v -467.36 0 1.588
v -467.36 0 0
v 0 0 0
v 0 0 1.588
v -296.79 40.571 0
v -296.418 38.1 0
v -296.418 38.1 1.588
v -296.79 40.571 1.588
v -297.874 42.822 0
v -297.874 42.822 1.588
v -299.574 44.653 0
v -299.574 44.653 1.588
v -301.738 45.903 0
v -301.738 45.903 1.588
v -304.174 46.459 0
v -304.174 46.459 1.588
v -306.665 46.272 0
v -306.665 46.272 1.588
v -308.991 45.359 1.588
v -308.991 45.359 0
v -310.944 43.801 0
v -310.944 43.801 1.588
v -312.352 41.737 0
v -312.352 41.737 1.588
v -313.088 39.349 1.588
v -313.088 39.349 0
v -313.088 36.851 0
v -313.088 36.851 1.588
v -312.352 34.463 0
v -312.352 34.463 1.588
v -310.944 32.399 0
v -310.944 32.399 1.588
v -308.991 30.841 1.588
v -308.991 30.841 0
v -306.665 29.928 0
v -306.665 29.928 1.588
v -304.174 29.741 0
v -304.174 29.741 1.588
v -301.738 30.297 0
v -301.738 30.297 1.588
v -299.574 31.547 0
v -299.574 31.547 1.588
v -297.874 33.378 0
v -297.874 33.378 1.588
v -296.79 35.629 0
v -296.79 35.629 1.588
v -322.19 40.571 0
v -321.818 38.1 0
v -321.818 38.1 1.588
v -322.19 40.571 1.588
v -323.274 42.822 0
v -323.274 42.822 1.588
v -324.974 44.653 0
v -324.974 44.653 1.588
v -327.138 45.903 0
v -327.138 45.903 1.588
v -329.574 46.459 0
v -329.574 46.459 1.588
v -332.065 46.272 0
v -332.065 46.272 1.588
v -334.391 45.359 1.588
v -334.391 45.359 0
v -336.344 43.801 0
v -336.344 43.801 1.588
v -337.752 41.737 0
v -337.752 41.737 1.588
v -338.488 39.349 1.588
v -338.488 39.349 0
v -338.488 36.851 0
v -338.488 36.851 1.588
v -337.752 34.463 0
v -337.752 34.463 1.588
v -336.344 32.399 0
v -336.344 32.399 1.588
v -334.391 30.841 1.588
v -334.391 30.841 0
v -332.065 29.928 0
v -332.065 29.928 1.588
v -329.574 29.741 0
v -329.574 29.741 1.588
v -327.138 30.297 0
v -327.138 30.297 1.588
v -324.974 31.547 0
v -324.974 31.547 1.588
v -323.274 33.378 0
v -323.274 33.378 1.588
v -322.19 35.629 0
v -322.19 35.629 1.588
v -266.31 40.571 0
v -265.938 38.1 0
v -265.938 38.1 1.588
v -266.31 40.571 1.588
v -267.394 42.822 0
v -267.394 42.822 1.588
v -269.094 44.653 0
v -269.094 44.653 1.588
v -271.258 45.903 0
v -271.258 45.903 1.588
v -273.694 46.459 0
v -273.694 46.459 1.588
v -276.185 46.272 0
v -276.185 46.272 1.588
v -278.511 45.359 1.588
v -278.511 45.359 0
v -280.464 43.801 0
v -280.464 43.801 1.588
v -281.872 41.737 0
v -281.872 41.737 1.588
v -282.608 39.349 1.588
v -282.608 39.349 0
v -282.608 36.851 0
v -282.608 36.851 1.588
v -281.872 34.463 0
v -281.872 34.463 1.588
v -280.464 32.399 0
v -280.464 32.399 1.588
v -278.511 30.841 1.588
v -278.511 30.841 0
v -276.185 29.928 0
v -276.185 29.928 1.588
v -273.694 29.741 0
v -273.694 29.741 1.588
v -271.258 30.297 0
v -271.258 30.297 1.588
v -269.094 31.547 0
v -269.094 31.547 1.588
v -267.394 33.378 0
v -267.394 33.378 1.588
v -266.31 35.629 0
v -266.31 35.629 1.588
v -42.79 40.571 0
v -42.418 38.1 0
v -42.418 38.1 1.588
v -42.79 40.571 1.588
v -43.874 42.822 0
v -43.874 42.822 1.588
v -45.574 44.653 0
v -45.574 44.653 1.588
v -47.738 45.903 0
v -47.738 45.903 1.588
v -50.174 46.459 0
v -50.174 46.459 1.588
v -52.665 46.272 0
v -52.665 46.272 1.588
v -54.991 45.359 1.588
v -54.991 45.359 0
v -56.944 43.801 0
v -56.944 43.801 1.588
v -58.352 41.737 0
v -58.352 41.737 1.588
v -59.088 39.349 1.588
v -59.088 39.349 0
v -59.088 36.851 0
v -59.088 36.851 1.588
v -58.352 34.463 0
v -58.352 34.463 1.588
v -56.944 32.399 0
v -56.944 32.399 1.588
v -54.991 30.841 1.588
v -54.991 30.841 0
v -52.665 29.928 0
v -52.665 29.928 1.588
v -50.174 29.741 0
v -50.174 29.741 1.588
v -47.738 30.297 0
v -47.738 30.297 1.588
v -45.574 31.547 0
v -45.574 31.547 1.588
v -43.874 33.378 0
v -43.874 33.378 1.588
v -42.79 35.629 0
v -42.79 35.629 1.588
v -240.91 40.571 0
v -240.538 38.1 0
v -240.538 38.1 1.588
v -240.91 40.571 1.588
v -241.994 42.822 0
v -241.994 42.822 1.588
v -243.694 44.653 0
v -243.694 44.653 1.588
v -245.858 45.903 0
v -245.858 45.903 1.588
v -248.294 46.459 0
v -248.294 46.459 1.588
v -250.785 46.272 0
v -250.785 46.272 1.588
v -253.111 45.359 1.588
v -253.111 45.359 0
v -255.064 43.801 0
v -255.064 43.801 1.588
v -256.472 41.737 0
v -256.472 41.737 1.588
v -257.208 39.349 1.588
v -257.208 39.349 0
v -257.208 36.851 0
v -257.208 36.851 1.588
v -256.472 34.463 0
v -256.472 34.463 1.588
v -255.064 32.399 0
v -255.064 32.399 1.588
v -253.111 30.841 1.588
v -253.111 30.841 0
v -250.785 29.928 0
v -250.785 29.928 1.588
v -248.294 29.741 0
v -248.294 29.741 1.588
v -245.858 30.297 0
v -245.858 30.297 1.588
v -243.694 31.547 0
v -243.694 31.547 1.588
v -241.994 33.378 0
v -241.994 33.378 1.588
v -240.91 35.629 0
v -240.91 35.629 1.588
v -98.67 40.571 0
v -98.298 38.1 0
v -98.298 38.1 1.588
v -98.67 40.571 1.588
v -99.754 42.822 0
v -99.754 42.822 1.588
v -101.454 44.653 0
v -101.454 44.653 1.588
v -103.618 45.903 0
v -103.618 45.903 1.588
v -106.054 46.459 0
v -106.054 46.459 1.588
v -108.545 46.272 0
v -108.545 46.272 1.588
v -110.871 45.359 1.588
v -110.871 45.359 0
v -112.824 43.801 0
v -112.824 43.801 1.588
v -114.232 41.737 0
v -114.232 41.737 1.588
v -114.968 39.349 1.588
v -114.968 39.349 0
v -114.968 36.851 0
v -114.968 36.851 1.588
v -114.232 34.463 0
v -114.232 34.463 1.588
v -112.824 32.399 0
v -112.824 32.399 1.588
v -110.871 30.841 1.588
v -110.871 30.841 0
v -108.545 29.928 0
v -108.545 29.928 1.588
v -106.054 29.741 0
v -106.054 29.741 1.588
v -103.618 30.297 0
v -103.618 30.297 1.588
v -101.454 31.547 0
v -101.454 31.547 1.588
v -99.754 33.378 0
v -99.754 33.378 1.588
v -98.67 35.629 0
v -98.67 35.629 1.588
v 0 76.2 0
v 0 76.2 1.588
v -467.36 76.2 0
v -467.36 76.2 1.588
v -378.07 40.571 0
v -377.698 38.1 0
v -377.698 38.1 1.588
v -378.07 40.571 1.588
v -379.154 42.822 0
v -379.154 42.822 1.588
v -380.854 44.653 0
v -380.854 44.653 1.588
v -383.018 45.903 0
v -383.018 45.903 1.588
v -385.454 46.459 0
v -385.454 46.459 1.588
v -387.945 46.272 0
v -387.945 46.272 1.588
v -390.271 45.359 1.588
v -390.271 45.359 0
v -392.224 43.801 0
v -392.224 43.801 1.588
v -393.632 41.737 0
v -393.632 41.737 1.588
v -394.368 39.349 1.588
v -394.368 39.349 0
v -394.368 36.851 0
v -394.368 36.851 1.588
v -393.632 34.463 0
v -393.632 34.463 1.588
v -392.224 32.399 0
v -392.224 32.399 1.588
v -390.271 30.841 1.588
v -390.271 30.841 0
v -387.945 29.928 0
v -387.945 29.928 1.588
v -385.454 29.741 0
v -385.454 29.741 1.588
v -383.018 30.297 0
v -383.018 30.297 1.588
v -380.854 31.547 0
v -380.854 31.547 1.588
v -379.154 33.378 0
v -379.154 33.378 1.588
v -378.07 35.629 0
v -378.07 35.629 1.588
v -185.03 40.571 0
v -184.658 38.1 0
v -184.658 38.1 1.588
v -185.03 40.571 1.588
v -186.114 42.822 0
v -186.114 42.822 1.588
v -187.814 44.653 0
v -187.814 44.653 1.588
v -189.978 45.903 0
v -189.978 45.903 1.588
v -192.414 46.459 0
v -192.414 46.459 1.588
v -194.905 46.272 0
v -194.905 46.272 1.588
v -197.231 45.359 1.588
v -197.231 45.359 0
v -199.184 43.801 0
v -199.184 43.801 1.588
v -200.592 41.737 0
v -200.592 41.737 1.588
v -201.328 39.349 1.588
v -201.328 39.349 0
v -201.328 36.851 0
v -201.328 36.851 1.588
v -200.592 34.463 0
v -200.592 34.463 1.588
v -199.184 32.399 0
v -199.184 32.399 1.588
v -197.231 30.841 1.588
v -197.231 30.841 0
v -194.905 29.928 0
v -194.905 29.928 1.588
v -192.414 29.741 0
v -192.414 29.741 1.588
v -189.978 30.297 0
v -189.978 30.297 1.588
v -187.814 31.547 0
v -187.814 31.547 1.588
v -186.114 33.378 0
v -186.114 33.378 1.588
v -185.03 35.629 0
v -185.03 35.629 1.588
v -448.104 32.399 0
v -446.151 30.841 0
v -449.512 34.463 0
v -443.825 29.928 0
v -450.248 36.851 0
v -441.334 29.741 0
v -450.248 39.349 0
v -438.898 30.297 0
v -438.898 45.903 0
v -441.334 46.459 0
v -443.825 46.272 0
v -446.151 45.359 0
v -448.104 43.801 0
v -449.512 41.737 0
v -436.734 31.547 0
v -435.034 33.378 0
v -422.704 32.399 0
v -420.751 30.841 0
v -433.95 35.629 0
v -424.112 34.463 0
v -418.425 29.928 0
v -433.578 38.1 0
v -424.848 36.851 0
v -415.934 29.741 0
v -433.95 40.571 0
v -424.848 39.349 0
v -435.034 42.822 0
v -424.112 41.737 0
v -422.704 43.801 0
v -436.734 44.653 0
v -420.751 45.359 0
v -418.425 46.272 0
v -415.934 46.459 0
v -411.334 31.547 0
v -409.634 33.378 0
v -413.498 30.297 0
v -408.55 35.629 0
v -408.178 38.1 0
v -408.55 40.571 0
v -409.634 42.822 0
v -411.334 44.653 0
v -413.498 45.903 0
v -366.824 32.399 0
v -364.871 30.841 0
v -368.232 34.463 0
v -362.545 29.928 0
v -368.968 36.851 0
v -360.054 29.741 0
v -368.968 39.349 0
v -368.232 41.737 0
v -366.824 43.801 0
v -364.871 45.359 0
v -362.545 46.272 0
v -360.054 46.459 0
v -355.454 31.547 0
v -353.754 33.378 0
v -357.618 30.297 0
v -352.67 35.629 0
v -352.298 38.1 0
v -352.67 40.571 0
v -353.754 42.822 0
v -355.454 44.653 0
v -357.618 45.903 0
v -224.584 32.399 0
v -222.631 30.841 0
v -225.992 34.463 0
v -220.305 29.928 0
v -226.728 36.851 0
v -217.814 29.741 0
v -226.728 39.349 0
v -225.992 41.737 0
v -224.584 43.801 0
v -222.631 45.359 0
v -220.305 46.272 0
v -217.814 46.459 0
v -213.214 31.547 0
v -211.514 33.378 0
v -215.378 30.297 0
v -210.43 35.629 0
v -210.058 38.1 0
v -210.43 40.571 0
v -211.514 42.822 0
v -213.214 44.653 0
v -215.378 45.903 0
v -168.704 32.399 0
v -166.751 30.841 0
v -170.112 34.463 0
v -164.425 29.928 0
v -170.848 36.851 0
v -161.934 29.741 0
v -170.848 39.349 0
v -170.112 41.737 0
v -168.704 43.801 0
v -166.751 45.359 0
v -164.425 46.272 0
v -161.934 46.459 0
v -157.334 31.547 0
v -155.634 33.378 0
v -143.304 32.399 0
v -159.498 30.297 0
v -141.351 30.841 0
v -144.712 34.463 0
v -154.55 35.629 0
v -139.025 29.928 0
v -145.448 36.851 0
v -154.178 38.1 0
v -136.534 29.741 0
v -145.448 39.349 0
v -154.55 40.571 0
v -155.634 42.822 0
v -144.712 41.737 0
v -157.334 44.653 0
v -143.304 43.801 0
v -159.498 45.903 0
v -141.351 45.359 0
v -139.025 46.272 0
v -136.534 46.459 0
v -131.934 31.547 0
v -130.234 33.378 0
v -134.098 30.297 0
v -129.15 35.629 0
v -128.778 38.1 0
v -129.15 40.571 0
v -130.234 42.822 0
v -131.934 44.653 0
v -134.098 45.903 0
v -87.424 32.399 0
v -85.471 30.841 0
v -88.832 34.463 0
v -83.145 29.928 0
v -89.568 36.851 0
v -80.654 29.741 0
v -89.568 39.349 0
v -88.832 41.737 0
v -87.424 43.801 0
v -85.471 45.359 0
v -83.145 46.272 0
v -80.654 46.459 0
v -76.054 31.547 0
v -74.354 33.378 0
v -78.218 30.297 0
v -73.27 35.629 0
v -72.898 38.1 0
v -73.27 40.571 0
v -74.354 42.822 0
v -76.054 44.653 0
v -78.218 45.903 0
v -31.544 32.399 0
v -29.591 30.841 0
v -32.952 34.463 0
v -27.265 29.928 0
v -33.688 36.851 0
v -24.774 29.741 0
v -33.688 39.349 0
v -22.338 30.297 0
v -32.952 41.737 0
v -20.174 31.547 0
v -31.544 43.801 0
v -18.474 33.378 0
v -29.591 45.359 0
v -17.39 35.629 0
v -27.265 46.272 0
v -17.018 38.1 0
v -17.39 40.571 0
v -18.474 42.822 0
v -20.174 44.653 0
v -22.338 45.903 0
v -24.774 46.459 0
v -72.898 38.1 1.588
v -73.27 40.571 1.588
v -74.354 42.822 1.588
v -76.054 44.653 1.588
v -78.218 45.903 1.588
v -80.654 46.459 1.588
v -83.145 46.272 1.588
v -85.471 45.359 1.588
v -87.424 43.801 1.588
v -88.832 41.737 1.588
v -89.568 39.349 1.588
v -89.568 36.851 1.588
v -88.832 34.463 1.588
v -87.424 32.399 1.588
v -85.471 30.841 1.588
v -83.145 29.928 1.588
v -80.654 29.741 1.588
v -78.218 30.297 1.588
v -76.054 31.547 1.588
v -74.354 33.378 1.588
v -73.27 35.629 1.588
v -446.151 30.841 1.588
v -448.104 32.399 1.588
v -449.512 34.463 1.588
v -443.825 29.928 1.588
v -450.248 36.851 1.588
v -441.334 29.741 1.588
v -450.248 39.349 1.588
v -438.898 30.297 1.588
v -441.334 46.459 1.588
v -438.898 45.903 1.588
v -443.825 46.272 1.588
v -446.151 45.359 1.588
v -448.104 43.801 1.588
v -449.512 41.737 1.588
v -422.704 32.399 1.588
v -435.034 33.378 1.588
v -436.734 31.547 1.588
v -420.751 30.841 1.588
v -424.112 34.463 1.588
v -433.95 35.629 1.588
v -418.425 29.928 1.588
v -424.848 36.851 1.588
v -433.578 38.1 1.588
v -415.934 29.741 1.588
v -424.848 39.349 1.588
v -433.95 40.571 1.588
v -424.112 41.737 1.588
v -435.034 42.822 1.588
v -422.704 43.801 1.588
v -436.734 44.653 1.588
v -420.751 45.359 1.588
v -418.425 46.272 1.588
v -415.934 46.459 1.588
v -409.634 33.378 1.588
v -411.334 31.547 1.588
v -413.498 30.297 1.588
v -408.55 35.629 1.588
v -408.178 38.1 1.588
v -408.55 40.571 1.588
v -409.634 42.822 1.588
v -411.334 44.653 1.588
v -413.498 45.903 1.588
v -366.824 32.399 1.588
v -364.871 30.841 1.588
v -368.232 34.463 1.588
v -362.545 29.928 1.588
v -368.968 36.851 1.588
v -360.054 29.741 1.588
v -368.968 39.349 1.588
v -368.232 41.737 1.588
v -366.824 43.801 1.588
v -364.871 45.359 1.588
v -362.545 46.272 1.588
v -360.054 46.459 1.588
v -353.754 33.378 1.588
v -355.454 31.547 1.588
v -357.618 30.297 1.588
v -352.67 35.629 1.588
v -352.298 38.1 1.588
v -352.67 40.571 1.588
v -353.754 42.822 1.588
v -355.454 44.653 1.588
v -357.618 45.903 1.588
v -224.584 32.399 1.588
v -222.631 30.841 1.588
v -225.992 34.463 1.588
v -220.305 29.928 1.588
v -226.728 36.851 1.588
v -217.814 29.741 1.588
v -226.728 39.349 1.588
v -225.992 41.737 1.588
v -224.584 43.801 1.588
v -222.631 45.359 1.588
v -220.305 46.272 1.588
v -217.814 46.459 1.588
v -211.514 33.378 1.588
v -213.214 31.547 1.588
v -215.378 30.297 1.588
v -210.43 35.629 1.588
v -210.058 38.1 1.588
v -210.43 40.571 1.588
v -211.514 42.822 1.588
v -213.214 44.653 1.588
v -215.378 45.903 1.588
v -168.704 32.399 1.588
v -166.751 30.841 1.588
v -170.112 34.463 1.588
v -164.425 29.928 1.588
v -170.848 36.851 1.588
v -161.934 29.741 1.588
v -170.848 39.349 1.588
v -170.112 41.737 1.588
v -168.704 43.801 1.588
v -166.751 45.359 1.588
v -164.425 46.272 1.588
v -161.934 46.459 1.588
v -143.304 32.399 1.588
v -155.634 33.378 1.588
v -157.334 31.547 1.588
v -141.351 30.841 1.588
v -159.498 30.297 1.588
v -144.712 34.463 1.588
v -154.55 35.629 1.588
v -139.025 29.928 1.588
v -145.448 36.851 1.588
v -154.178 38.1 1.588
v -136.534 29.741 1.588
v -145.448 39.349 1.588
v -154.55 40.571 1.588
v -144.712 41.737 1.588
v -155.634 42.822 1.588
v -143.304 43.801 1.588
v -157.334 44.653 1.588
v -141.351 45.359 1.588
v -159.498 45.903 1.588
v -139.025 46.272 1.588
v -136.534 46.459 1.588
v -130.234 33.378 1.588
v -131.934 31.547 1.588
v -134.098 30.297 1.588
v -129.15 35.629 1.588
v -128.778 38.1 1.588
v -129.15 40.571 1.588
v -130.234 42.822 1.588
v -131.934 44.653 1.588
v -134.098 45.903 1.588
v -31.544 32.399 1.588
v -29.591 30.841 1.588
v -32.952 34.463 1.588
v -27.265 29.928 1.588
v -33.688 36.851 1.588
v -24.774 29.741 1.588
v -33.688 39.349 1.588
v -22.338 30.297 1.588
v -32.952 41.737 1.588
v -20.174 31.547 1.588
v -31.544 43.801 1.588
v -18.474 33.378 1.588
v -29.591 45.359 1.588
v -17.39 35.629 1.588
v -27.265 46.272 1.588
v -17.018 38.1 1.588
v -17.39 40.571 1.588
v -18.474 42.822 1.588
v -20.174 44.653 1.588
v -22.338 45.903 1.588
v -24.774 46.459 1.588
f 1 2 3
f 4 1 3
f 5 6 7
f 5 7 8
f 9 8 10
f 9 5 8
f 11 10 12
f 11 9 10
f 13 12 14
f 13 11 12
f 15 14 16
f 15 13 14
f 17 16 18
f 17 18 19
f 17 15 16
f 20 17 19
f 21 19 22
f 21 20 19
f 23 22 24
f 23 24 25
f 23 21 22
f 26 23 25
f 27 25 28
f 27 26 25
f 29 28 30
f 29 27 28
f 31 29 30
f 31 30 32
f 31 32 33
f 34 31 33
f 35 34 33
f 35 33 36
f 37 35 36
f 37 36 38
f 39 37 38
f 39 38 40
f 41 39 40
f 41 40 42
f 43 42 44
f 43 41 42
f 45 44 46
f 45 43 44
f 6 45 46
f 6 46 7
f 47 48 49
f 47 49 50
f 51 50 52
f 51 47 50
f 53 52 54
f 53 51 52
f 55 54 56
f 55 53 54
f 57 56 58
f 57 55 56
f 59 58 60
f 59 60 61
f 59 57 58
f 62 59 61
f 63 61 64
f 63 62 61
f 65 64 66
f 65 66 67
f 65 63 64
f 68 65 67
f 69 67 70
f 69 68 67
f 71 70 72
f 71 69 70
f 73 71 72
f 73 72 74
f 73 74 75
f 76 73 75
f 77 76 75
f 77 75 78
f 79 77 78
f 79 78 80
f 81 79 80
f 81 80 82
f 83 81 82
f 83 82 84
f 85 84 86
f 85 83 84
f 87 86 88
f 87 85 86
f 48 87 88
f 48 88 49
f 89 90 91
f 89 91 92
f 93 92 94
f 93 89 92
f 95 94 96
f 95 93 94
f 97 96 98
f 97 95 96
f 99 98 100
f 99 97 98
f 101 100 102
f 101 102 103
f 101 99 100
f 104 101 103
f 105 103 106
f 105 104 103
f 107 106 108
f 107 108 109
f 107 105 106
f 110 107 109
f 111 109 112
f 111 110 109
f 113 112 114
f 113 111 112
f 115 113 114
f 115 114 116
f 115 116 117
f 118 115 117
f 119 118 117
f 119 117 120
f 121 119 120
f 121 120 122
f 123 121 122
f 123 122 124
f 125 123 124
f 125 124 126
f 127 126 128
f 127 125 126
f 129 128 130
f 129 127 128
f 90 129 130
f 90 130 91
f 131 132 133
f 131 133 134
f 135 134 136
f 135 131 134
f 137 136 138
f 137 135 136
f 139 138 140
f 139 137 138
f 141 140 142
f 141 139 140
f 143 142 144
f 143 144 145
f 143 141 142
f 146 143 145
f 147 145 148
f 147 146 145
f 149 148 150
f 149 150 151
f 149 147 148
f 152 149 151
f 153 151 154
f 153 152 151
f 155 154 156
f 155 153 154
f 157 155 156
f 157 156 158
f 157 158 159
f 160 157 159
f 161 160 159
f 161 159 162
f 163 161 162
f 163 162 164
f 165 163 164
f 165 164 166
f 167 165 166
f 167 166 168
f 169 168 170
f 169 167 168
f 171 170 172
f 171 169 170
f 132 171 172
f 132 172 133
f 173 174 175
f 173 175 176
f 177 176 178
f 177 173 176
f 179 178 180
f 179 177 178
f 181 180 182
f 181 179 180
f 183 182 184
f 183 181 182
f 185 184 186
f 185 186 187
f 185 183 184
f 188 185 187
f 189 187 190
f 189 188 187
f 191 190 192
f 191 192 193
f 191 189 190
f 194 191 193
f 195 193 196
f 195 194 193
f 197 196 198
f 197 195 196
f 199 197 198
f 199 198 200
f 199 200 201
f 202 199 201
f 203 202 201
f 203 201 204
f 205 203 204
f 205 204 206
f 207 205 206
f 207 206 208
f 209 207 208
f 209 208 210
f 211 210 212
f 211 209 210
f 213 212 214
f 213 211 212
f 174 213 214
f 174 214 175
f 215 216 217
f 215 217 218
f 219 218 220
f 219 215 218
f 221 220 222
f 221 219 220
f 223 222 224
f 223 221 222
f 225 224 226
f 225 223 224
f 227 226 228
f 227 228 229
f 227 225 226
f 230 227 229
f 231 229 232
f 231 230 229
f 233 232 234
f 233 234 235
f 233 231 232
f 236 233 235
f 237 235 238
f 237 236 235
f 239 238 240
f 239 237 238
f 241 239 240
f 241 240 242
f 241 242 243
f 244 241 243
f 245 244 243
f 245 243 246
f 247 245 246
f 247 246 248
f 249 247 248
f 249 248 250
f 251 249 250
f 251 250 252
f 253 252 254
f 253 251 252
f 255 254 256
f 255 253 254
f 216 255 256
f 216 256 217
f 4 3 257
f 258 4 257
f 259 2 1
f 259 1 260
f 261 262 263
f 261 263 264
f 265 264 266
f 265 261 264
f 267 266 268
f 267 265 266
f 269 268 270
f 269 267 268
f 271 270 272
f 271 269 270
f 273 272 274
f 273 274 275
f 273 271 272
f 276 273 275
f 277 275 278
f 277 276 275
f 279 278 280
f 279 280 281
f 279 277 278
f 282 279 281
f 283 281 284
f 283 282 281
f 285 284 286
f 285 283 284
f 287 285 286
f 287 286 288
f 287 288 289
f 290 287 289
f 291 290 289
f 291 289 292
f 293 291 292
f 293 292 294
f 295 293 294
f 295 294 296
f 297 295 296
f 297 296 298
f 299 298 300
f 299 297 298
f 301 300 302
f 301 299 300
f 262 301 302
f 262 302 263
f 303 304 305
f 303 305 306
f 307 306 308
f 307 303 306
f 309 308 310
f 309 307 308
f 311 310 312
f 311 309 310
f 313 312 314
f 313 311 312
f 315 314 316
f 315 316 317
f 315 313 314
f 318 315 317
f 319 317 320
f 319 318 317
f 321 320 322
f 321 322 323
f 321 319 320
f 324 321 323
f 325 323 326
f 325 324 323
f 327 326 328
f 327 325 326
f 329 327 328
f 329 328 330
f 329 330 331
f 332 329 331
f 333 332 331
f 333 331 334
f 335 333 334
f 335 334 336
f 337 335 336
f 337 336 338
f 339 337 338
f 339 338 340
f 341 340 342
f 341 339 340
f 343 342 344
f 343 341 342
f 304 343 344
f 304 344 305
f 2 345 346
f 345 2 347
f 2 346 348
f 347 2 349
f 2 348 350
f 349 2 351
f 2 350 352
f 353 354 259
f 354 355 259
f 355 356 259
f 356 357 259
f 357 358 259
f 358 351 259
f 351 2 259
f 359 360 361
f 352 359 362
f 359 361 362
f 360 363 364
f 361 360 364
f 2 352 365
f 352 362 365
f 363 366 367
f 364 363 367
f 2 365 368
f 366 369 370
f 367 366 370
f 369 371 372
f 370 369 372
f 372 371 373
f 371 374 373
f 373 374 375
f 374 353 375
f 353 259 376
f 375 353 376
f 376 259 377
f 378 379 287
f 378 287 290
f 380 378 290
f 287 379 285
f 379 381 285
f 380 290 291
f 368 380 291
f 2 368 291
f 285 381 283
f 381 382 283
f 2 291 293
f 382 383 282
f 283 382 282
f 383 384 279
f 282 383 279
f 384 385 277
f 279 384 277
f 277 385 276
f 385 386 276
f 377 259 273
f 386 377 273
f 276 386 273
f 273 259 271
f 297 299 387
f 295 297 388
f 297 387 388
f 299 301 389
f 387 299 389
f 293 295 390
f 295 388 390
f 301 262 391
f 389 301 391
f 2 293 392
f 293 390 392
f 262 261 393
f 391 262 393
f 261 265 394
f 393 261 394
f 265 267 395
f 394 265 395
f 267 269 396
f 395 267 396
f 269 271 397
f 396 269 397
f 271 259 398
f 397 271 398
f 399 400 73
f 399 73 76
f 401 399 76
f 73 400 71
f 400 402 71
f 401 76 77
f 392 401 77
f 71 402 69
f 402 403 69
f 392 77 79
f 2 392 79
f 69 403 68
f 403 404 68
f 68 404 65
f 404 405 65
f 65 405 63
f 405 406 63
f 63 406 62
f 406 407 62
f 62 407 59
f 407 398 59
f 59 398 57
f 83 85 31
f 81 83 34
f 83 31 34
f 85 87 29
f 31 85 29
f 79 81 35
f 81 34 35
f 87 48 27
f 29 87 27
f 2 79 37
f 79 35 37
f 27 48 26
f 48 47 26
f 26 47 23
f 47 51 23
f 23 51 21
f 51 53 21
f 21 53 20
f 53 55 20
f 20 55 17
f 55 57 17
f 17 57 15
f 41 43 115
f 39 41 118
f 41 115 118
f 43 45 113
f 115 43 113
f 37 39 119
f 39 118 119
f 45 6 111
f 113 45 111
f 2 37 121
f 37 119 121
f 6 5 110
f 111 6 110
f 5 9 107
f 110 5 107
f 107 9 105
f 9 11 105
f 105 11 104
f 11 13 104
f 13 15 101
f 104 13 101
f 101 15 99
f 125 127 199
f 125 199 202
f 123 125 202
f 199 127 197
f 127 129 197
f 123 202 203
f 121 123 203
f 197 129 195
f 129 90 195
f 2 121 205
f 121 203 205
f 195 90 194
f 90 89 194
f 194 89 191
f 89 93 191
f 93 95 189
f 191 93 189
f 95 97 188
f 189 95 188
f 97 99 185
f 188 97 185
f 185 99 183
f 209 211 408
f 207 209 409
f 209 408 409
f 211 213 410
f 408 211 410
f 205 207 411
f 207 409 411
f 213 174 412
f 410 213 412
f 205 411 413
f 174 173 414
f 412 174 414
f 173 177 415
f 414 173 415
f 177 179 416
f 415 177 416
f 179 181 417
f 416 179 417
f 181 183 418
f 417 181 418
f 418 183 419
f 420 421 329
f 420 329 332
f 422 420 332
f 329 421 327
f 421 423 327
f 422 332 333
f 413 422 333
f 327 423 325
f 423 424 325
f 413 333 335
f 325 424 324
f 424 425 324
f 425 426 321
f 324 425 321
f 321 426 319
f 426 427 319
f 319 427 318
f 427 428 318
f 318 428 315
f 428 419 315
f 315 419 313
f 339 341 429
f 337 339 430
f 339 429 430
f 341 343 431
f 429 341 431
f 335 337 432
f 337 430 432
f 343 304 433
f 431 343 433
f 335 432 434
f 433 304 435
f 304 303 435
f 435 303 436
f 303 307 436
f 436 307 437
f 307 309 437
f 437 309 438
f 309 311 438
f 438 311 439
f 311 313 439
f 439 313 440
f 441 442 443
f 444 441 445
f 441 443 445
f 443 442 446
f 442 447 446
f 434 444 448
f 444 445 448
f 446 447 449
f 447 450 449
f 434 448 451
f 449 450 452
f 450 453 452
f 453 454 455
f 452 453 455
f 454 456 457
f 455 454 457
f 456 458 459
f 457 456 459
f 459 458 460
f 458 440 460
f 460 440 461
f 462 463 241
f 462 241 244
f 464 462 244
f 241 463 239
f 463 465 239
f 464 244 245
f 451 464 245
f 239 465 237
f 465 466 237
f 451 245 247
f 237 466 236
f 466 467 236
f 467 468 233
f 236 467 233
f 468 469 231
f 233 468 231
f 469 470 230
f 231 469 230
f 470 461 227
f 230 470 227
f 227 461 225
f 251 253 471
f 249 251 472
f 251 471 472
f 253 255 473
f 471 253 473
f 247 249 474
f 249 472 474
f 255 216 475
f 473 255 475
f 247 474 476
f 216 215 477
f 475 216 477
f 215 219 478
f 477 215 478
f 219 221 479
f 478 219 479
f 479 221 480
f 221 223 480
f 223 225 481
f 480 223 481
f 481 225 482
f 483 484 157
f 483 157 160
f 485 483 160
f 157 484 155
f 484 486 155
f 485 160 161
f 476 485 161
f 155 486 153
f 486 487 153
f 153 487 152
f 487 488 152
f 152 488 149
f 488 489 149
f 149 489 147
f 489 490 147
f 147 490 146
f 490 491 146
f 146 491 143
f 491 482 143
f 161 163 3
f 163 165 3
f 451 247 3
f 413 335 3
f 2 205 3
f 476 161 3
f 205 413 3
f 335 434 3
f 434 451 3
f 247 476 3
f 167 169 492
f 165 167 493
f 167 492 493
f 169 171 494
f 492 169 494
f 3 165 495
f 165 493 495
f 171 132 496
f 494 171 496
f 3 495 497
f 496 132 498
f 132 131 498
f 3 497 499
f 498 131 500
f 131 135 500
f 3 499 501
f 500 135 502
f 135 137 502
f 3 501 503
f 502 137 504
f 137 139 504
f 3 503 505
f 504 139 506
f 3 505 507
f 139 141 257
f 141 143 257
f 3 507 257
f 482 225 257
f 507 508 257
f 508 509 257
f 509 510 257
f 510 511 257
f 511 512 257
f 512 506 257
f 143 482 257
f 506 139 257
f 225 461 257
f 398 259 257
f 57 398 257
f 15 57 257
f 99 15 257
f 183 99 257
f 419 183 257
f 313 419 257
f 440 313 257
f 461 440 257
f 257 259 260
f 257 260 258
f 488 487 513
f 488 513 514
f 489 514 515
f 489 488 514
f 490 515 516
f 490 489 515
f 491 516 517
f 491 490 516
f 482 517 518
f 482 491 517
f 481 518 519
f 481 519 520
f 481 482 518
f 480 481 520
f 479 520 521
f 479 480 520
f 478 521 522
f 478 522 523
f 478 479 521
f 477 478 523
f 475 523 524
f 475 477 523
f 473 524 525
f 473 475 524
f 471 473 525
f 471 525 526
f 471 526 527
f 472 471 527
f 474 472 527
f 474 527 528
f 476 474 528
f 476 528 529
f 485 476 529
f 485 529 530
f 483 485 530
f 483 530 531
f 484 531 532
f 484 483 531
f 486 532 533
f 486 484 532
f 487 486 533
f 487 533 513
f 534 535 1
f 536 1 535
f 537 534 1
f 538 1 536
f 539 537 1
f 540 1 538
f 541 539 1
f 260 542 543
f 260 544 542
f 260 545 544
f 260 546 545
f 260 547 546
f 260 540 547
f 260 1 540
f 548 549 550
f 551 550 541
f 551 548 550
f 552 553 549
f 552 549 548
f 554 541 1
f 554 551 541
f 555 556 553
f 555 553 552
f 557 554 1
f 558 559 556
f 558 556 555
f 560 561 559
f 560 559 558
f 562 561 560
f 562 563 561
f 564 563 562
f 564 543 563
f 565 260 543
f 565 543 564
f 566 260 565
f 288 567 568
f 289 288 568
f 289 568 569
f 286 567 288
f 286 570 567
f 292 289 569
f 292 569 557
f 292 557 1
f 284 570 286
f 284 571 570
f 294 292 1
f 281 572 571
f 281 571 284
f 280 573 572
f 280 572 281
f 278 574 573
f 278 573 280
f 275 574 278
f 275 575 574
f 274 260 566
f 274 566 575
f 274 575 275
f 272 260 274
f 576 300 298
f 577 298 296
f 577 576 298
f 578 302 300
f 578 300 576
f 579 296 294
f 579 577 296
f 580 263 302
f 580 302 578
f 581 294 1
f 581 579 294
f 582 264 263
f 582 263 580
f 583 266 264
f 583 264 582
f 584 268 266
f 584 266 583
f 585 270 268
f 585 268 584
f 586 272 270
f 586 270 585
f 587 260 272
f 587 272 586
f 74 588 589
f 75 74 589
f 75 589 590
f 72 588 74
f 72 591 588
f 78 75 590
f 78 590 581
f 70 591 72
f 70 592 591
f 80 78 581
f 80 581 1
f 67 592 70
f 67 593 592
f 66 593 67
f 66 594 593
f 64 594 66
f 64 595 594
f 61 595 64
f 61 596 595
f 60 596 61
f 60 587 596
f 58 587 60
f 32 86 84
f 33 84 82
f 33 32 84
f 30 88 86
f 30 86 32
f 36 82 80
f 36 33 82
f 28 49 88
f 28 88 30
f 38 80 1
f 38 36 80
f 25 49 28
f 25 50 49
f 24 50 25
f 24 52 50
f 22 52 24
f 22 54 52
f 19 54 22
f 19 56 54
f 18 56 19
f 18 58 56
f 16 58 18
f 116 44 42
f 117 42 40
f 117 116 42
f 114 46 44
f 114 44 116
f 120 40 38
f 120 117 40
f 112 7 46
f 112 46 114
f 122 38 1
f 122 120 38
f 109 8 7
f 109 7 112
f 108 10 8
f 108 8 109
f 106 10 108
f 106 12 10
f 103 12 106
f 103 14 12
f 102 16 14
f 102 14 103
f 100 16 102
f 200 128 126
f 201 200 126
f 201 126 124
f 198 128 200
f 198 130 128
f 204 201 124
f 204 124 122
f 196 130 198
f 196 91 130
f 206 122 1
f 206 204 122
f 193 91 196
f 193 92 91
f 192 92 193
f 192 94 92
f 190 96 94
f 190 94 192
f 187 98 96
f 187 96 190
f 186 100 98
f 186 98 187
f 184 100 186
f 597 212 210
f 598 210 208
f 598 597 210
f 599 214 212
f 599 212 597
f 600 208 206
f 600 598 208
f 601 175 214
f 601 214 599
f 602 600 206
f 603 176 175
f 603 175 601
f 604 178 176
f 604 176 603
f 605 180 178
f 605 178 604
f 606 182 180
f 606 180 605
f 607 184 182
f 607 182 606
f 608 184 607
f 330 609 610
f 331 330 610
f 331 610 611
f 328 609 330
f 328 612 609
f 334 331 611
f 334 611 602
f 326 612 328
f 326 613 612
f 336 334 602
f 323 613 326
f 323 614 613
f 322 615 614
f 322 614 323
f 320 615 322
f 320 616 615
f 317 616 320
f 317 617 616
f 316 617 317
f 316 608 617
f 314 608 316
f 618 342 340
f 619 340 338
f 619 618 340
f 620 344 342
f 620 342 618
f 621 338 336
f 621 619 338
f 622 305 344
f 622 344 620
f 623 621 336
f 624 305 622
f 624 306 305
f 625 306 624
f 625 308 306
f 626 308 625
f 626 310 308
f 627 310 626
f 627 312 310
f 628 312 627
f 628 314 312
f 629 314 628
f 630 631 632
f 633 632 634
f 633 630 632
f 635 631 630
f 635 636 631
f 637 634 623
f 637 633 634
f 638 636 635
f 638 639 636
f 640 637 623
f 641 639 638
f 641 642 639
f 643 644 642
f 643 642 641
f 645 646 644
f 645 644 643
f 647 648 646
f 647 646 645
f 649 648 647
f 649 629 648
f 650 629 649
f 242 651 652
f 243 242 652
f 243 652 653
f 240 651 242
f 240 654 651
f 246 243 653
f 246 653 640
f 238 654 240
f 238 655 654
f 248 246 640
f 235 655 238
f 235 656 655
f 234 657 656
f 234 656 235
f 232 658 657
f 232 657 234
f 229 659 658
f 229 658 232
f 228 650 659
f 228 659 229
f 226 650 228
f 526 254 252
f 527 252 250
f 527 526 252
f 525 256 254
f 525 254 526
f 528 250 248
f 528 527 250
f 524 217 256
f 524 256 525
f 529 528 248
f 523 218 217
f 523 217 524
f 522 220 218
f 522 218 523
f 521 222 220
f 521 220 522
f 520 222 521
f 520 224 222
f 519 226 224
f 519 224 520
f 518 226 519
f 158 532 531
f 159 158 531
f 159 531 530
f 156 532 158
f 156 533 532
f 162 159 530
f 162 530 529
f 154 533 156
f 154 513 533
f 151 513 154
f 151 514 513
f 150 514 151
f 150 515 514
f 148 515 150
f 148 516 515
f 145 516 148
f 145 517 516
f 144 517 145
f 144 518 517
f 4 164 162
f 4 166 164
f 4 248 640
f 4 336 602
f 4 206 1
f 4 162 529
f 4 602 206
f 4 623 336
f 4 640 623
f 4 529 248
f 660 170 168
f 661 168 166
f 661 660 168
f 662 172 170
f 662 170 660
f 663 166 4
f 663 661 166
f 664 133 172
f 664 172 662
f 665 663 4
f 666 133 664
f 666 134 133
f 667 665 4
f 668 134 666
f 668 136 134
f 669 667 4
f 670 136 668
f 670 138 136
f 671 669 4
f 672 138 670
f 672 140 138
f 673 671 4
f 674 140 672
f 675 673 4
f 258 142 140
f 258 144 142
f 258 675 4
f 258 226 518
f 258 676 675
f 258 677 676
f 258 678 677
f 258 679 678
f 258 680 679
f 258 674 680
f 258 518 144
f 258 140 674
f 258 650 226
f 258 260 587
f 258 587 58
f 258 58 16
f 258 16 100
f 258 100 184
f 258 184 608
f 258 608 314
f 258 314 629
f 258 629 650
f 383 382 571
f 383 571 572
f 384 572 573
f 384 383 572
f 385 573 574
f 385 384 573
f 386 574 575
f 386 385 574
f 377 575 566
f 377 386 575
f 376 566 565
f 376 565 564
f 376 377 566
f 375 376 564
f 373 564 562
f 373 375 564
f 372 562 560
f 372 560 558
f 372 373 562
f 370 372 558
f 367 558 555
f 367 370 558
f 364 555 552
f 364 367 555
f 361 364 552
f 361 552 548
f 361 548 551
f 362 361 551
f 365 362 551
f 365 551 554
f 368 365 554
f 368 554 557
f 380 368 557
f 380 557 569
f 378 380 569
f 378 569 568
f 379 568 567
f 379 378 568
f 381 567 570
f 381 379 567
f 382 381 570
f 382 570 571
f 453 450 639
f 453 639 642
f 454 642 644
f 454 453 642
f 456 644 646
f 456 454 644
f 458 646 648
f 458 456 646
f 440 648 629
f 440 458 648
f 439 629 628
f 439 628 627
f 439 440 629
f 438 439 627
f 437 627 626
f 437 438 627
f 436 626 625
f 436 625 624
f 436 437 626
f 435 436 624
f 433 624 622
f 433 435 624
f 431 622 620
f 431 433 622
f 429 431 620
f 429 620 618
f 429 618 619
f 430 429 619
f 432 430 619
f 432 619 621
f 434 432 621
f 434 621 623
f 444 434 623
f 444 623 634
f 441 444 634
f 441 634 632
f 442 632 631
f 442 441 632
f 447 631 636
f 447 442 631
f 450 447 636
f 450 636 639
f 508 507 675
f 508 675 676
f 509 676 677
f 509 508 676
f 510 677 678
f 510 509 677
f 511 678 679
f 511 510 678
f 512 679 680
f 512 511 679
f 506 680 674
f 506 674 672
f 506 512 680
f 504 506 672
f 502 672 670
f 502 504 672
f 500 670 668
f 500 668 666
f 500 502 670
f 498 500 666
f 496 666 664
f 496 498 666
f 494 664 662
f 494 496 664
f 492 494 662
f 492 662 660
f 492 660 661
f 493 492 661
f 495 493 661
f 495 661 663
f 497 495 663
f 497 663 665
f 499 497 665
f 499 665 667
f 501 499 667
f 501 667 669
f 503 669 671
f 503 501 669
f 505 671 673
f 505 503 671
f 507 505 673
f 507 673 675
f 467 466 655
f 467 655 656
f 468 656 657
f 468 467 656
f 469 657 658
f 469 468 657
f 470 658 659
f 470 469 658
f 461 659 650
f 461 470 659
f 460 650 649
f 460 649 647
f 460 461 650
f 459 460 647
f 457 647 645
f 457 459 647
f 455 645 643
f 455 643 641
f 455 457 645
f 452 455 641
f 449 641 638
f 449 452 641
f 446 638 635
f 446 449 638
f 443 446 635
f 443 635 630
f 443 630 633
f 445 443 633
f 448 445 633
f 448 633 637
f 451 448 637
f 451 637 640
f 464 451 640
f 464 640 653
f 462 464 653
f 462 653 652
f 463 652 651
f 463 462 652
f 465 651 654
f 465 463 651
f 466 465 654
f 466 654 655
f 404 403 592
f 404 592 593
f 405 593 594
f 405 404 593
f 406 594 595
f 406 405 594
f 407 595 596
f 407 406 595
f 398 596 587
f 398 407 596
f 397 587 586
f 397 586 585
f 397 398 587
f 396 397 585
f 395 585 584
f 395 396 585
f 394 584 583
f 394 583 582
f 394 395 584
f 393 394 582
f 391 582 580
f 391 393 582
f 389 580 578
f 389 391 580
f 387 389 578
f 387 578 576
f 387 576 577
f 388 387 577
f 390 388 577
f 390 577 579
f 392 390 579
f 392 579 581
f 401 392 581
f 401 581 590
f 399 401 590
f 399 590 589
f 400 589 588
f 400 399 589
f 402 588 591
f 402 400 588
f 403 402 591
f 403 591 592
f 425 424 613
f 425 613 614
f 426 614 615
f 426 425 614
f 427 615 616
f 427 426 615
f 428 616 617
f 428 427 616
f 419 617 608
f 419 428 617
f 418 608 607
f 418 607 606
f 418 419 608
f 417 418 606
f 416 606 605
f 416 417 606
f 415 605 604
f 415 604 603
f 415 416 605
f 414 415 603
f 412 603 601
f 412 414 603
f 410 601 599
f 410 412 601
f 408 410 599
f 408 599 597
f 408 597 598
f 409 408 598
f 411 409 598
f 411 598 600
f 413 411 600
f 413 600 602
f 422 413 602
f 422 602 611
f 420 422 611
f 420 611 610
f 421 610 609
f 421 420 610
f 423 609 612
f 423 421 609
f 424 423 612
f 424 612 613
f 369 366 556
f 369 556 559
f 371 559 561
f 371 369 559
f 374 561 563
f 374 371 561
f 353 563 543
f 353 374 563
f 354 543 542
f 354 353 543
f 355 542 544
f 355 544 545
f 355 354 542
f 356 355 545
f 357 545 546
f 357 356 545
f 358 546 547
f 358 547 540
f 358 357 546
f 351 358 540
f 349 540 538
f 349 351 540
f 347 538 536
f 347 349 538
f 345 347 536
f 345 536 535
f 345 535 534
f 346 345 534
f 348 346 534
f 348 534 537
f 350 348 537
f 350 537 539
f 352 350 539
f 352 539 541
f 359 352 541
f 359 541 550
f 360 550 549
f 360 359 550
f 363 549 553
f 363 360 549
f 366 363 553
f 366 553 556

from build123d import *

# Parameters (mm, degrees)
F0_W     = 467.36
F0_H     = 76.2
F0_R     = 8.382
F1_DEPTH = 1.5875


with BuildPart() as f1:
    # F0 (on Top) → F1 (new body)
    with BuildSketch(Plane.XY):
        with Locations((-233.68, 38.1)):
            Rectangle(F0_W, F0_H)
        with Locations((-441.96, 38.1)):
            Circle(F0_R, mode=Mode.SUBTRACT)
        with Locations((-416.56, 38.1)):
            Circle(F0_R, mode=Mode.SUBTRACT)
        with Locations((-386.08, 38.1)):
            Circle(F0_R, mode=Mode.SUBTRACT)
        with Locations((-360.68, 38.1)):
            Circle(F0_R, mode=Mode.SUBTRACT)
        with Locations((-330.2, 38.1)):
            Circle(F0_R, mode=Mode.SUBTRACT)
        with Locations((-304.8, 38.1)):
            Circle(F0_R, mode=Mode.SUBTRACT)
        with Locations((-274.32, 38.1)):
            Circle(F0_R, mode=Mode.SUBTRACT)
        with Locations((-248.92, 38.1)):
            Circle(F0_R, mode=Mode.SUBTRACT)
        with Locations((-218.44, 38.1)):
            Circle(F0_R, mode=Mode.SUBTRACT)
        with Locations((-193.04, 38.1)):
            Circle(F0_R, mode=Mode.SUBTRACT)
        with Locations((-162.56, 38.1)):
            Circle(F0_R, mode=Mode.SUBTRACT)
        with Locations((-137.16, 38.1)):
            Circle(F0_R, mode=Mode.SUBTRACT)
        with Locations((-106.68, 38.1)):
            Circle(F0_R, mode=Mode.SUBTRACT)
        with Locations((-81.28, 38.1)):
            Circle(F0_R, mode=Mode.SUBTRACT)
        with Locations((-50.8, 38.1)):
            Circle(F0_R, mode=Mode.SUBTRACT)
        with Locations((-25.4, 38.1)):
            Circle(F0_R, mode=Mode.SUBTRACT)
    extrude(amount=F1_DEPTH)


solid = f1.part
